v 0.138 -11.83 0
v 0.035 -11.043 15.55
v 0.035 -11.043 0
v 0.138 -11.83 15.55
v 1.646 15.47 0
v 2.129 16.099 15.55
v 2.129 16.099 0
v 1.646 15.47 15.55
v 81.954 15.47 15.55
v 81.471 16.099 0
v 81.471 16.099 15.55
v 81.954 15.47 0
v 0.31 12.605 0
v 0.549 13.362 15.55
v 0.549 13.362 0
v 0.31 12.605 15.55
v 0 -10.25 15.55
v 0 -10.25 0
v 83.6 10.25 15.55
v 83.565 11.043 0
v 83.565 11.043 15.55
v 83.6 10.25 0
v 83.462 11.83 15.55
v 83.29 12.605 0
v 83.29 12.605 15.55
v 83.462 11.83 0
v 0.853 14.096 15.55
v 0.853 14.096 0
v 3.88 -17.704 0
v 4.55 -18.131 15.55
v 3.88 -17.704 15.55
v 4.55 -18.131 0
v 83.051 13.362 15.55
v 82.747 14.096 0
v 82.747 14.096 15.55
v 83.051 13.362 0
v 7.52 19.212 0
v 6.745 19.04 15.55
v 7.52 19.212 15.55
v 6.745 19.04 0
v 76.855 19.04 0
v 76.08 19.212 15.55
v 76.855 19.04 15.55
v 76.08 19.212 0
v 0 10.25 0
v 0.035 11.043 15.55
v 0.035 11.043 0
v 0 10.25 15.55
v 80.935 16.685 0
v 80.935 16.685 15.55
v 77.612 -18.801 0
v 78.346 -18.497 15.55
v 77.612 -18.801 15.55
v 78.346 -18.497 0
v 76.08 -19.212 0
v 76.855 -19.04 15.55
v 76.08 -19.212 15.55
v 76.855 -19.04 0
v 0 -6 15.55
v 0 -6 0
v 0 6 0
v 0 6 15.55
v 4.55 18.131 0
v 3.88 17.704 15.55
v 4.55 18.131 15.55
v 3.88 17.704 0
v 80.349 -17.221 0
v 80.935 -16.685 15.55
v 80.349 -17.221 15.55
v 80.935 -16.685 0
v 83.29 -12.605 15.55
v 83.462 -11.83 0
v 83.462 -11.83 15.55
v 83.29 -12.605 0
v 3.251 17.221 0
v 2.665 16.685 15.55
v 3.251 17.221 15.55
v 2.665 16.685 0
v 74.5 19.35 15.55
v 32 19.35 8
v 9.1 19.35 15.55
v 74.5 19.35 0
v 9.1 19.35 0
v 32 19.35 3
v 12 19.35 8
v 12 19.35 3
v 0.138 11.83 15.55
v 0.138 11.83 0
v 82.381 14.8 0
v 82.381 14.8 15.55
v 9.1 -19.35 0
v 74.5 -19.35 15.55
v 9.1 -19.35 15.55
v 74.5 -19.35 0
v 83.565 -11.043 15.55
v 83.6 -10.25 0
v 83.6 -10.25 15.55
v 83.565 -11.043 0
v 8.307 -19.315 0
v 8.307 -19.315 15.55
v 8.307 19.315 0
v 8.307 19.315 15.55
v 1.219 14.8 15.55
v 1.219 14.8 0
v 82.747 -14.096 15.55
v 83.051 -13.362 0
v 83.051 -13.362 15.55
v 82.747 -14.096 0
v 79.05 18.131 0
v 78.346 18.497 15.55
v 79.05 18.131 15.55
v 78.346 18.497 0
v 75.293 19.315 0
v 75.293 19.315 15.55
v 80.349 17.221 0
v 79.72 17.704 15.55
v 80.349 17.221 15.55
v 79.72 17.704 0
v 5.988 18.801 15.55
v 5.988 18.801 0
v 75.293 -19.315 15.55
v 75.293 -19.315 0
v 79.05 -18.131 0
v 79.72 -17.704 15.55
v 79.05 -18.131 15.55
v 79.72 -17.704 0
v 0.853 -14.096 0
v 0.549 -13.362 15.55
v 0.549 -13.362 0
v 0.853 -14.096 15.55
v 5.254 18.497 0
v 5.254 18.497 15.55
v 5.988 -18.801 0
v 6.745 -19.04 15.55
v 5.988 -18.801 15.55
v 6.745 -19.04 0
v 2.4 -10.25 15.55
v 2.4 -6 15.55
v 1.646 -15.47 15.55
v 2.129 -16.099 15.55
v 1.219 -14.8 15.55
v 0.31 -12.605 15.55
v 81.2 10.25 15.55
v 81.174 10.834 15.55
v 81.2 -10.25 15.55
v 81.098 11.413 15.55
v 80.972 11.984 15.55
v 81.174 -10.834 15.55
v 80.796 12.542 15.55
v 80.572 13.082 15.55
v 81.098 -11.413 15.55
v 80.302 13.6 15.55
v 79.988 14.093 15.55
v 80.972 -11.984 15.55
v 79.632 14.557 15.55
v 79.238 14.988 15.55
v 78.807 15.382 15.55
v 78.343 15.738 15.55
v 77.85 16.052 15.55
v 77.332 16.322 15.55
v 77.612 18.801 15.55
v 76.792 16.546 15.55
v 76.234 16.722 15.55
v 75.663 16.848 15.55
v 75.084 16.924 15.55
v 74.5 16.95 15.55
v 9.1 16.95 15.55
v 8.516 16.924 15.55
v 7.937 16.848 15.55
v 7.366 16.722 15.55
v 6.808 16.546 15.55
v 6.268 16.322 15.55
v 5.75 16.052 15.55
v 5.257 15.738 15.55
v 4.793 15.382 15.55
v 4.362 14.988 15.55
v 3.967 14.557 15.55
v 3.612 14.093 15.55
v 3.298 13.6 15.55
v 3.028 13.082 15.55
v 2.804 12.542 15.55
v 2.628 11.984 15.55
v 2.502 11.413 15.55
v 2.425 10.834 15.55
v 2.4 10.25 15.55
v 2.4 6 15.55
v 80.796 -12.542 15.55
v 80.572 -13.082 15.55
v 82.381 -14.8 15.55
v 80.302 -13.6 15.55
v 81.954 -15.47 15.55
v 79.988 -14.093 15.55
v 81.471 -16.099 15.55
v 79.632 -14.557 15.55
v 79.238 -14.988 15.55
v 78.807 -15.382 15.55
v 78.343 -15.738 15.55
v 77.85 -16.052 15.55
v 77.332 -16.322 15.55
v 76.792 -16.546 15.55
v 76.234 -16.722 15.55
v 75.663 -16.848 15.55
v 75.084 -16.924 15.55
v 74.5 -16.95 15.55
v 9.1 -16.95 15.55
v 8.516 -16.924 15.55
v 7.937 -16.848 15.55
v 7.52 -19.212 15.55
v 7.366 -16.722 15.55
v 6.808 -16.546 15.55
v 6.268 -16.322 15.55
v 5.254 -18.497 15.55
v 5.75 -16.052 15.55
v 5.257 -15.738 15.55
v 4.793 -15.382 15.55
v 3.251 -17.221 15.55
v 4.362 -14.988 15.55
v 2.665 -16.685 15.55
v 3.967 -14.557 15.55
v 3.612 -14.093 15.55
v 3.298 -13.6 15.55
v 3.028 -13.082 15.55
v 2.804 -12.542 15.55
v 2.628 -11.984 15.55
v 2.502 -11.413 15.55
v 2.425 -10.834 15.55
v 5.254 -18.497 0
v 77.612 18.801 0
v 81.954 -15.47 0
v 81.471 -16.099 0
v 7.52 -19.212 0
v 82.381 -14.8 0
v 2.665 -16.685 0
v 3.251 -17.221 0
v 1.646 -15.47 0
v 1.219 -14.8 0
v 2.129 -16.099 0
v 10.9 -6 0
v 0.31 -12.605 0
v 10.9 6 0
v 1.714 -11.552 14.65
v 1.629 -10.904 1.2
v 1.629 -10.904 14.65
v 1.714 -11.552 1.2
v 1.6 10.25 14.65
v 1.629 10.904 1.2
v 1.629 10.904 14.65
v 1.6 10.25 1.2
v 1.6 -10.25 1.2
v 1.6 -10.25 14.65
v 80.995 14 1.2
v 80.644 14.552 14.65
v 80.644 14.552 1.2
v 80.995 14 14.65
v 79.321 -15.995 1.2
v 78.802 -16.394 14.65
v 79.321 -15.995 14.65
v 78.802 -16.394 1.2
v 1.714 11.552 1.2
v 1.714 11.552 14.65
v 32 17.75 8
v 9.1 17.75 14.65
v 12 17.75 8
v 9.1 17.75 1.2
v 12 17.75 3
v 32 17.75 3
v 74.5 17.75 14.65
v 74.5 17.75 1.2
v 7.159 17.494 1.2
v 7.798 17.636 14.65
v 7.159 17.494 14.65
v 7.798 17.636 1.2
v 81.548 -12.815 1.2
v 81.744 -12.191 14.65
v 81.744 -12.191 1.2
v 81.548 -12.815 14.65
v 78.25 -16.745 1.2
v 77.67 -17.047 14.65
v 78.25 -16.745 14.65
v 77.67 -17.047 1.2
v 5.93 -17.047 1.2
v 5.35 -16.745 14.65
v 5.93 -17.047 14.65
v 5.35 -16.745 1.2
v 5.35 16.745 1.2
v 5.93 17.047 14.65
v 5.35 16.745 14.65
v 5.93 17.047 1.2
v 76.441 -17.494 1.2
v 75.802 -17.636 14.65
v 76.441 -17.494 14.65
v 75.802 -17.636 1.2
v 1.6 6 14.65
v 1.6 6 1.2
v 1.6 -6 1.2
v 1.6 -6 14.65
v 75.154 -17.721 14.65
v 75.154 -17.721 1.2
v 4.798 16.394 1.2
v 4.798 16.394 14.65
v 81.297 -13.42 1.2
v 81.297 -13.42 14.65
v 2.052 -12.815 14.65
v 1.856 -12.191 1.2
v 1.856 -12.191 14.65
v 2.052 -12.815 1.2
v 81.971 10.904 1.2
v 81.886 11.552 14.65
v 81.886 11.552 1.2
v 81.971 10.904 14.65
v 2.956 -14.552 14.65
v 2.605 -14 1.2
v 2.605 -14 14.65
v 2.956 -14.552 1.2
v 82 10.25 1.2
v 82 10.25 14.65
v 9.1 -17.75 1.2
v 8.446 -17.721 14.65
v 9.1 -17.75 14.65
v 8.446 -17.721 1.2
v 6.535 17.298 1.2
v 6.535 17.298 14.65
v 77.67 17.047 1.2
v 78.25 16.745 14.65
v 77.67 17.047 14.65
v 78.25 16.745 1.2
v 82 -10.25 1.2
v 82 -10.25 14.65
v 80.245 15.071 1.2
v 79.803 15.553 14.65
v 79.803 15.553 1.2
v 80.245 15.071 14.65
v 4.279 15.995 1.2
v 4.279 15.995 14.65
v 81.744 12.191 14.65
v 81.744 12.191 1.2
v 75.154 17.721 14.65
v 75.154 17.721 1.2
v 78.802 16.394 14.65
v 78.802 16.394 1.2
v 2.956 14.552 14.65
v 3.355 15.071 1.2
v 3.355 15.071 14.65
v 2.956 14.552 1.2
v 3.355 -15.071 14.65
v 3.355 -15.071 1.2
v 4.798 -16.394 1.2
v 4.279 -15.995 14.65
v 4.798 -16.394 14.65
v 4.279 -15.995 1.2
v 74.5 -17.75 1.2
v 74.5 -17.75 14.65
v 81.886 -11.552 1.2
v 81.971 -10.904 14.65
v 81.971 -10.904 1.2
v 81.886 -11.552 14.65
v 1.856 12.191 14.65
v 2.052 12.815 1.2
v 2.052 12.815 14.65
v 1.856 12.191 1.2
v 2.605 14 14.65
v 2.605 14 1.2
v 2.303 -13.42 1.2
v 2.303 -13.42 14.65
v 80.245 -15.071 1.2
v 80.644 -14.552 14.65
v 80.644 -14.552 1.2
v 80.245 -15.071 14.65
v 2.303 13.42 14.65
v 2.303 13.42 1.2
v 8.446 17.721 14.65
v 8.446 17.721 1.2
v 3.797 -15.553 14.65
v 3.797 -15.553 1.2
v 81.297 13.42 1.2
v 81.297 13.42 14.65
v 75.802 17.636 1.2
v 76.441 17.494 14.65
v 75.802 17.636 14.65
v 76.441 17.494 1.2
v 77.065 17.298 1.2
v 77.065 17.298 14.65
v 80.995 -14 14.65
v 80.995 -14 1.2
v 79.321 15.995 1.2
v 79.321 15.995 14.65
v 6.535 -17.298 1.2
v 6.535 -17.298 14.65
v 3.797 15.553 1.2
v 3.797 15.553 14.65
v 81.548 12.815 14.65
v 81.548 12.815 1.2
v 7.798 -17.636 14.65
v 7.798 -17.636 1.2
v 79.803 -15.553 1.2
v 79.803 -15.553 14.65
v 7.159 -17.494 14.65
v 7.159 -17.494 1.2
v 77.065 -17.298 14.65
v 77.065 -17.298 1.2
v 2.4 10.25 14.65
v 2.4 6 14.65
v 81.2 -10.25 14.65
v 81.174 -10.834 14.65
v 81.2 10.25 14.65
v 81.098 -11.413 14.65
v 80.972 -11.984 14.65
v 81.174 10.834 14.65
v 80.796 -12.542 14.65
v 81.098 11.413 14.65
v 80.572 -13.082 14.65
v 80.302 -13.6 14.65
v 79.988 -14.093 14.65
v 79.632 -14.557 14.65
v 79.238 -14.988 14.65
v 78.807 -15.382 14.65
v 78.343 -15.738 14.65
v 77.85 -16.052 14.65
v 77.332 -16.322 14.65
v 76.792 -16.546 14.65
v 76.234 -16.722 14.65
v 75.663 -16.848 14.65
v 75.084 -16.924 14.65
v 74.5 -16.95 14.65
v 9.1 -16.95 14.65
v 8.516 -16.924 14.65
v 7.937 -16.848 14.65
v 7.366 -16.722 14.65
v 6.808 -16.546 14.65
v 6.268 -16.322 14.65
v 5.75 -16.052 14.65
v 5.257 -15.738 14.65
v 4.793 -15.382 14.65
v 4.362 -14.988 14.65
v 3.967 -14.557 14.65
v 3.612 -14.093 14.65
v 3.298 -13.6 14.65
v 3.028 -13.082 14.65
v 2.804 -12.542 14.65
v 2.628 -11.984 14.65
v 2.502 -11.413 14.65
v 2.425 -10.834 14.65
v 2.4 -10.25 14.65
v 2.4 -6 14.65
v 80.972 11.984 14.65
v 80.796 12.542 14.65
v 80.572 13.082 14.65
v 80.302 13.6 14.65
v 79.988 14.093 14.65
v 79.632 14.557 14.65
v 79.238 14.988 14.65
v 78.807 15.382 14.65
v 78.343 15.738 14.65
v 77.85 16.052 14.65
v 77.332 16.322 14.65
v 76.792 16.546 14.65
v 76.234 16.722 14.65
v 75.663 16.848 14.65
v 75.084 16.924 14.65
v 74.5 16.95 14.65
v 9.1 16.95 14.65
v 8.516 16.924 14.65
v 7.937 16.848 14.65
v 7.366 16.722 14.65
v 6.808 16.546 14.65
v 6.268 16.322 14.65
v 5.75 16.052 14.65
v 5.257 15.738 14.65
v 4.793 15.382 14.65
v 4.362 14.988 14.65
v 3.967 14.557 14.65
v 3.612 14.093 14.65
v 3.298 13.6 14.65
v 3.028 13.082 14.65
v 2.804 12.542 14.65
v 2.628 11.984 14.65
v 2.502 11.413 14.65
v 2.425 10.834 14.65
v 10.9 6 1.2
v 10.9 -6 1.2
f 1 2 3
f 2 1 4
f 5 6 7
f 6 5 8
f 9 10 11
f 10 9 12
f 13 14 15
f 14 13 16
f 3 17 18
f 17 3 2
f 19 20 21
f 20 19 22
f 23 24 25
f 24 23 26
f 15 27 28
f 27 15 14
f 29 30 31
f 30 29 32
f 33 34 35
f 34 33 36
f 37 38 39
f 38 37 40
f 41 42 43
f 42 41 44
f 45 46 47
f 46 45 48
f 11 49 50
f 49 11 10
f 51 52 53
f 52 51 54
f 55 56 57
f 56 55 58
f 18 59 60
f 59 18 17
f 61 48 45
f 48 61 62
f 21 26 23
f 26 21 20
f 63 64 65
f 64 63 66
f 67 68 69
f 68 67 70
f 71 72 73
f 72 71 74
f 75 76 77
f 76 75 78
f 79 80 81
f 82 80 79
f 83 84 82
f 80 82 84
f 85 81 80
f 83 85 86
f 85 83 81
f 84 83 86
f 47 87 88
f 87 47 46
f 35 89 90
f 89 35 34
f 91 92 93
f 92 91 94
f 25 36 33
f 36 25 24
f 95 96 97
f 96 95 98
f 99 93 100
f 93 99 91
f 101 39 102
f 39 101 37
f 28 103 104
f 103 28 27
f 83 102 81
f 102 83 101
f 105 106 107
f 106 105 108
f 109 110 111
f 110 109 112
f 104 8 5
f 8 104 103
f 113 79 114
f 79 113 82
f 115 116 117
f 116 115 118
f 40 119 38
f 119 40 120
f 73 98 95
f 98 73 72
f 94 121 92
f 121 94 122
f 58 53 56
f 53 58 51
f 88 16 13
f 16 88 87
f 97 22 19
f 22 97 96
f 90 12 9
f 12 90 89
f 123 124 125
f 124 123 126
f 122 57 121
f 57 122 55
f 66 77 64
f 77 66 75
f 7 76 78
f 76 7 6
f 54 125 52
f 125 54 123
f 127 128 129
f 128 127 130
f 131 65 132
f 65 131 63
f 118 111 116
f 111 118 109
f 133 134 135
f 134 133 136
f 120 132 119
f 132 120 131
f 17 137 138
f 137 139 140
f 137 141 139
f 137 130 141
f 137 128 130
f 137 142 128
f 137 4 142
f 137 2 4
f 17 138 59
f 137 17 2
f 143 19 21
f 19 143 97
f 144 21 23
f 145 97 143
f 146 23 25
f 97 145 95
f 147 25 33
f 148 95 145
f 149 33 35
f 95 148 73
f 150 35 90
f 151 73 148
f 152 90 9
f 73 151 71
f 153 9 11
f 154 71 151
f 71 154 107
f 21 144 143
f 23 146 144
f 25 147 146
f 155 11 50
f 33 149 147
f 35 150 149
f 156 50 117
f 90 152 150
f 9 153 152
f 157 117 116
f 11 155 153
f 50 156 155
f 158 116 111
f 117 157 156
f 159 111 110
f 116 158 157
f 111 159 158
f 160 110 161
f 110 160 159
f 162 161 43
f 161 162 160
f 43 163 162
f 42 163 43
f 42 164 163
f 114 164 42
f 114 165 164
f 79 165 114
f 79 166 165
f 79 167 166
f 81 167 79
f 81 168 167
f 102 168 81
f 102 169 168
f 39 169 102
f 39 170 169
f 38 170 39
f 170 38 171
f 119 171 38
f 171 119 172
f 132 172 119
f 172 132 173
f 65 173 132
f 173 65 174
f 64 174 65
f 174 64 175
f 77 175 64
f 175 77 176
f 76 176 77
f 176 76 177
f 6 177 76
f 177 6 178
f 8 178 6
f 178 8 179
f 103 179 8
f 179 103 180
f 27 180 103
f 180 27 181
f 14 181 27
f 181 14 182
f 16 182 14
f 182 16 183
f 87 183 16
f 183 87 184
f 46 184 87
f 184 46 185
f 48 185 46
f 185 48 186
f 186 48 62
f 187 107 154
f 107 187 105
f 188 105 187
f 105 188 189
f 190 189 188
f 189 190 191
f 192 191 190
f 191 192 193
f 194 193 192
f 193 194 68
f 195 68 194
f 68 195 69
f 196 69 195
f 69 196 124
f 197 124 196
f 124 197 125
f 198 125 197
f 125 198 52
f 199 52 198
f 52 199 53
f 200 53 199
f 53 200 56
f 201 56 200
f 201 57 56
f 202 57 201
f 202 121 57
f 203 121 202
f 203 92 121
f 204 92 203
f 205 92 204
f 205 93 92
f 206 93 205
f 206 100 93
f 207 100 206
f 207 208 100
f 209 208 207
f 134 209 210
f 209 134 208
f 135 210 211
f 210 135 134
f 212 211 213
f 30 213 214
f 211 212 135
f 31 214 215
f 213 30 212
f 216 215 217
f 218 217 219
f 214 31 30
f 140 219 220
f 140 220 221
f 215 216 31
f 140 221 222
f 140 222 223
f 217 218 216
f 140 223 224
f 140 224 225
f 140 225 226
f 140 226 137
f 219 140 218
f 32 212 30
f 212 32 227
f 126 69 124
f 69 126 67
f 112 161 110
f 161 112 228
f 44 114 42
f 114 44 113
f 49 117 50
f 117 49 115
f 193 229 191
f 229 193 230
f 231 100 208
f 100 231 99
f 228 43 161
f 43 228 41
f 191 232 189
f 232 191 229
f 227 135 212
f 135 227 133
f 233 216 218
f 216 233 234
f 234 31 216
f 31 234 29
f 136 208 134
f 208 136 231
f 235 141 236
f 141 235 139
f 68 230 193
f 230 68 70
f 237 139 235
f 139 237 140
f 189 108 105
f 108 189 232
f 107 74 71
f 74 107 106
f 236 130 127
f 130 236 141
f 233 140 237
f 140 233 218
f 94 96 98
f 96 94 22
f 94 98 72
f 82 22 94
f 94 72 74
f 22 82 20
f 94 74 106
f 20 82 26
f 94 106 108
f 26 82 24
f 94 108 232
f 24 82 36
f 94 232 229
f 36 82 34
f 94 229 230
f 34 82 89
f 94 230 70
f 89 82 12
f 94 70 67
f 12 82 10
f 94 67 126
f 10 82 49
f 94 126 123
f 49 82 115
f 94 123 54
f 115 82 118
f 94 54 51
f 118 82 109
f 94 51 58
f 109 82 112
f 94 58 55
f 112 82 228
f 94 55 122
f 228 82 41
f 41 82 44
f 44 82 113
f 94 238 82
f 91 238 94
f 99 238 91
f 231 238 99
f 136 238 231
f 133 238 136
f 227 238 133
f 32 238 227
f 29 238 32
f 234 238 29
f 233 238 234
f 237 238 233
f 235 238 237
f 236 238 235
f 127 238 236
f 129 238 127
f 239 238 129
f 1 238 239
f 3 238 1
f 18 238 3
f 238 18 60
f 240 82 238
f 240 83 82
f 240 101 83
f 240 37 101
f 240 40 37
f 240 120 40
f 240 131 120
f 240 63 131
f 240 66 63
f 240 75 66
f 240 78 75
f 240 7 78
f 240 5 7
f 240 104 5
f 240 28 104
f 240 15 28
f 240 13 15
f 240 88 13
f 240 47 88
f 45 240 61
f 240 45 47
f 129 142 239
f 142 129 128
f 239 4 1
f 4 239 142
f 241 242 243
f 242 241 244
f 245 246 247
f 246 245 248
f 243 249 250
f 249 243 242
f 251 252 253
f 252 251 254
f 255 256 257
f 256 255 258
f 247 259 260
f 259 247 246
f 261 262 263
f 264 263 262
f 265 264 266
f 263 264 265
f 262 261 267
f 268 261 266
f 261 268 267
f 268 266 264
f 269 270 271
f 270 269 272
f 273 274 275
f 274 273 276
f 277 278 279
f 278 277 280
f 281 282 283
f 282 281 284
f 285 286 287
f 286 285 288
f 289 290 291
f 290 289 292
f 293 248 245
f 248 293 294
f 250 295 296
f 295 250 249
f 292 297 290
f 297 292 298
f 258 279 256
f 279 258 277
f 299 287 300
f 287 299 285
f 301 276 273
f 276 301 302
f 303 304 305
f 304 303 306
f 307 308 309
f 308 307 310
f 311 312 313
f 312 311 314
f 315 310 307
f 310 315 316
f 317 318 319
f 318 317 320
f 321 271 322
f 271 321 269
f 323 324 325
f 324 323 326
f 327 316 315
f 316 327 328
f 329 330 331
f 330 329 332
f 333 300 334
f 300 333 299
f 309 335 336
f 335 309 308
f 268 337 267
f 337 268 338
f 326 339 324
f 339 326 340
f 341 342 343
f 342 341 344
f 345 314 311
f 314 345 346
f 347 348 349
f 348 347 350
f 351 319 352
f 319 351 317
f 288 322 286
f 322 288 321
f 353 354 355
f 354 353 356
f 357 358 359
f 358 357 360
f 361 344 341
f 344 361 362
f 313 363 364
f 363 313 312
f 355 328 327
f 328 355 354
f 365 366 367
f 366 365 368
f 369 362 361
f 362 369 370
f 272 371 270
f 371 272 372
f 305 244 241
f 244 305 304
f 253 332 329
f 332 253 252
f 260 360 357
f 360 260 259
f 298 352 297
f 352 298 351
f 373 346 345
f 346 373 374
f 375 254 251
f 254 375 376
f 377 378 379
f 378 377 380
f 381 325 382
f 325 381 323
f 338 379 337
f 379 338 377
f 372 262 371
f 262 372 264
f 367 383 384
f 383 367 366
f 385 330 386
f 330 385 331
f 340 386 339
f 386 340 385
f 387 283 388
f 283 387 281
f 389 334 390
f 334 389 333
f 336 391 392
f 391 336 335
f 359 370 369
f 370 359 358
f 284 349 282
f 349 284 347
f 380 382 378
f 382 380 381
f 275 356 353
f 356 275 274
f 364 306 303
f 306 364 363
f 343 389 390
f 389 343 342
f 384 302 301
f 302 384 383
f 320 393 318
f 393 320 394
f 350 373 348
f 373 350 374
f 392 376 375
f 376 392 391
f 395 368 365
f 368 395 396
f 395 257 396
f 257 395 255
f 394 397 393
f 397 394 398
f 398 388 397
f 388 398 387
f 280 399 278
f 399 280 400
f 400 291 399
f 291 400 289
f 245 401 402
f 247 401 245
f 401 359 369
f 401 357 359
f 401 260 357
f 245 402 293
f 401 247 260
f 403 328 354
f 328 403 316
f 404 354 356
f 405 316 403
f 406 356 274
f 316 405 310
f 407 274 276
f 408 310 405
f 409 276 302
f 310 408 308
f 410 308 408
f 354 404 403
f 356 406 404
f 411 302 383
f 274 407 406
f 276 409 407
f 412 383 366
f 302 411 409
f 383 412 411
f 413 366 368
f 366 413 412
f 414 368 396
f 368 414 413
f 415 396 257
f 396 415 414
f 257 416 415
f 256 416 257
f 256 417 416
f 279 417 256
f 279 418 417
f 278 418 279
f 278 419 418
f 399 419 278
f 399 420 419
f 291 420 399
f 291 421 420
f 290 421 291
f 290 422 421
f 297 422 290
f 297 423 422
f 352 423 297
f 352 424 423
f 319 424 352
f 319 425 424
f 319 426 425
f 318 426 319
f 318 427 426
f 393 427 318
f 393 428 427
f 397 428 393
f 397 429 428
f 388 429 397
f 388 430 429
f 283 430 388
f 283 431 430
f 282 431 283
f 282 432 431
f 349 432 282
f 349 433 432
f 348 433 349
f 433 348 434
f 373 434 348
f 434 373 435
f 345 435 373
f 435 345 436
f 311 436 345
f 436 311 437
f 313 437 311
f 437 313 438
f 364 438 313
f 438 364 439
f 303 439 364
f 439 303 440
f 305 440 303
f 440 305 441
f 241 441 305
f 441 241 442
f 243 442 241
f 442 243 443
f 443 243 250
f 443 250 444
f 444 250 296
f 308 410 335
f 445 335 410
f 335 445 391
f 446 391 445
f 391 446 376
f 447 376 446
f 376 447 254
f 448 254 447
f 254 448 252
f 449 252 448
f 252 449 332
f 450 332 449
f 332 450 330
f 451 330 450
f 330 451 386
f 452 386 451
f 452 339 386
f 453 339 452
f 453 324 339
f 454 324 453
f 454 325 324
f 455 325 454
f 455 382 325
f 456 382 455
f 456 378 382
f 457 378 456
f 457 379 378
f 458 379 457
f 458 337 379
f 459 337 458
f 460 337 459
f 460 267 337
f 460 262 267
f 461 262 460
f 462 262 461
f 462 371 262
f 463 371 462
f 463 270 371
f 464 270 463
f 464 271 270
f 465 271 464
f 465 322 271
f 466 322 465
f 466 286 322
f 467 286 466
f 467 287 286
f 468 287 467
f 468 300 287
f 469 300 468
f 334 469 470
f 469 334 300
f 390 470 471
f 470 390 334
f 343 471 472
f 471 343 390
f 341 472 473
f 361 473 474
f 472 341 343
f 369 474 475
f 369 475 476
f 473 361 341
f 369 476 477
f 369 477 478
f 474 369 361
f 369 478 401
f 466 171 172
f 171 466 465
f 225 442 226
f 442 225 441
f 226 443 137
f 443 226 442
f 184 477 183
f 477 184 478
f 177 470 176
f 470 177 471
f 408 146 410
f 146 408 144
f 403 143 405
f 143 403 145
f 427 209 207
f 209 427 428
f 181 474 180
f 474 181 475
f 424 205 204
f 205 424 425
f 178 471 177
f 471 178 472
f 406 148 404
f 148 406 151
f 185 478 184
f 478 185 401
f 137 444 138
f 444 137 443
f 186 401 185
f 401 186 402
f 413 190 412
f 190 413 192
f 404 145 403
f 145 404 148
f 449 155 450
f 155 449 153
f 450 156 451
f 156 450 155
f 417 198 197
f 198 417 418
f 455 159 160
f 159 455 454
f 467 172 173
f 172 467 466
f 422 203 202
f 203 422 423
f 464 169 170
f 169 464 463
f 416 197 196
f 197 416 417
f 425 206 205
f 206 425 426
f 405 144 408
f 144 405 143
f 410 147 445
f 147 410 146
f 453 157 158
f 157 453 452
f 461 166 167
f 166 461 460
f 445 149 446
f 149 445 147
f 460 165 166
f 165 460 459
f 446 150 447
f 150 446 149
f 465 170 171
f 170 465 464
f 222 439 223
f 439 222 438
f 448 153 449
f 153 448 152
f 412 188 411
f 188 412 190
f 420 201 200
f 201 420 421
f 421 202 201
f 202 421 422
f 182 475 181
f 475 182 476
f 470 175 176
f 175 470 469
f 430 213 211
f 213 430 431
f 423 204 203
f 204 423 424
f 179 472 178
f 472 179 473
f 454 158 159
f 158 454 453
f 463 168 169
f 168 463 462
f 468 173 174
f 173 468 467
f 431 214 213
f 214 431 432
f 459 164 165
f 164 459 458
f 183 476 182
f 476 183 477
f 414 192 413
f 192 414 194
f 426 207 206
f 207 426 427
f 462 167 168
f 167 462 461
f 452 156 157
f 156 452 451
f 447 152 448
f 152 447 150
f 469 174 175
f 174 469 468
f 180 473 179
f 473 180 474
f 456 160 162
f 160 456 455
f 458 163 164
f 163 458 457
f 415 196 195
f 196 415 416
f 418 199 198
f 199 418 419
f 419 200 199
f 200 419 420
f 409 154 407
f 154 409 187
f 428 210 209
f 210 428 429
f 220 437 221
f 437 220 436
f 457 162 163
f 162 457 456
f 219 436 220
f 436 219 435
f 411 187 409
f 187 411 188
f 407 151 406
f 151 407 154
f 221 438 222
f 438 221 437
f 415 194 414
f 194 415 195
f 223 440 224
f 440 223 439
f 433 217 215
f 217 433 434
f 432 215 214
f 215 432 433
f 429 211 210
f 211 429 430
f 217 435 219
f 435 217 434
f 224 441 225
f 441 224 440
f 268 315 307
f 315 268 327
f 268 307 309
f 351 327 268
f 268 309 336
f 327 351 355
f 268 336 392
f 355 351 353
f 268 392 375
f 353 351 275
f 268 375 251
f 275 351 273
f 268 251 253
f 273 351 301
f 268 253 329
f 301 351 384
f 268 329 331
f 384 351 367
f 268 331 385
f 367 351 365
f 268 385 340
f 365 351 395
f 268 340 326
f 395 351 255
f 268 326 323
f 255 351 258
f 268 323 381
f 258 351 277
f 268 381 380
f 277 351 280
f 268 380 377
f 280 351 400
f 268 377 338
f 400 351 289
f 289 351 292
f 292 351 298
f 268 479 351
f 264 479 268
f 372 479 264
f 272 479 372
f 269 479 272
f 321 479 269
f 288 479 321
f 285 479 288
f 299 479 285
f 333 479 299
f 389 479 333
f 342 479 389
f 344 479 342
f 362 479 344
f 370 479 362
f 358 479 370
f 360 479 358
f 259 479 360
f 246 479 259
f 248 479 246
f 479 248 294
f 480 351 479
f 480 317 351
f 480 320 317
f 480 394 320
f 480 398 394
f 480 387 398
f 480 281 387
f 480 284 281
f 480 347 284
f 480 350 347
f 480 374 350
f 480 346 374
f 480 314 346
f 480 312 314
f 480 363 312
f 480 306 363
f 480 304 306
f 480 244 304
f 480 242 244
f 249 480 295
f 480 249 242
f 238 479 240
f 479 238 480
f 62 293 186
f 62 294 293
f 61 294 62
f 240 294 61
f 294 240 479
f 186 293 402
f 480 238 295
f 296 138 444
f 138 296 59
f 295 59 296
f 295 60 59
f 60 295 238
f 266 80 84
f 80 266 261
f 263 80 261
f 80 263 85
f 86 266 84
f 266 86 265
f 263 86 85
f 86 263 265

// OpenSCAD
// BYD SEAL — bumper protetor em TPU
// V0.1 PARAMÉTRICA — face frontal aberta, traseira e laterais protegidas.
// O manual oficial confirma quatro controles, indicador e chave mecânica,
// mas não publica dimensões da carcaça.
// X = comprimento; Y = largura; Z = espessura.

$fn = 72;
MODEL_NAME = "BYD SEAL";

// Medidas provisórias do corpo da chave
KEY_L = 80.0;       // X, mm
KEY_W = 35.0;       // Y, mm
KEY_T = 15.0;       // Z, mm
KEY_R = 7.5;

// Folgas e paredes TPU
CLR_X = 0.40;
CLR_Y = 0.25;
CLR_Z = 0.35;
BACK = 1.20;
SIDE_WALL = 1.60;
FACE_CLEARANCE = 1.00;
LIP_IN = 0.80;
LIP_H = 0.90;

// Abertura para argola/cinta; confirmar na smart key do mercado do usuário.
RING_NOTCH_L = 11.0;
RING_NOTCH_W = 12.0;

// Abertura de serviço para chave mecânica removível/integrada.
MECH_SLOT = true;
MECH_SLOT_X = 12.0;
MECH_SLOT_L = 20.0;
MECH_SLOT_Z = 3.0;
MECH_SLOT_H = 5.0;
MECH_SLOT_SIDE = 1;

INNER_L = KEY_L + CLR_X;
INNER_W = KEY_W + 2*CLR_Y;
INNER_T = KEY_T + CLR_Z;
OUTER_L = INNER_L + 2*SIDE_WALL;
OUTER_W = INNER_W + 2*SIDE_WALL;
WALL_H = max(1.0, INNER_T - FACE_CLEARANCE);
OUTER_H = BACK + WALL_H;
OUTER_R = min(KEY_R + SIDE_WALL, OUTER_W/2 - 0.30);
INNER_R = min(KEY_R, INNER_W/2 - 0.30);

module rounded2d(l,w,r) {
    hull() {
        for (x=[r,l-r])
            for (y=[-w/2+r,w/2-r])
                translate([x,y]) circle(r=r);
    }
}
module rounded_prism(l,w,h,r) { linear_extrude(height=h) rounded2d(l,w,r); }
module base_plate() { rounded_prism(OUTER_L,OUTER_W,BACK,OUTER_R); }
module side_ring() {
    difference() {
        rounded_prism(OUTER_L,OUTER_W,OUTER_H,OUTER_R);
        translate([SIDE_WALL,0,BACK-0.05]) rounded_prism(INNER_L,INNER_W,WALL_H+0.20,INNER_R);
    }
}
module retention_lip() {
    difference() {
        translate([0,0,BACK+WALL_H-LIP_H]) rounded_prism(OUTER_L,OUTER_W,LIP_H,OUTER_R);
        translate([SIDE_WALL+LIP_IN,0,BACK+WALL_H-LIP_H-0.05])
            rounded_prism(INNER_L-2*LIP_IN,INNER_W-2*LIP_IN,LIP_H+0.20,max(0.5,INNER_R-LIP_IN));
    }
}
module ring_notch() {
    translate([-0.10,-RING_NOTCH_W/2,-0.10]) cube([RING_NOTCH_L,RING_NOTCH_W,OUTER_H+0.30]);
}
module mechanical_slot() {
    if (MECH_SLOT) {
        y0 = MECH_SLOT_SIDE > 0 ? OUTER_W/2-SIDE_WALL-0.10 : -OUTER_W/2+0.10;
        translate([MECH_SLOT_X,y0,MECH_SLOT_Z]) cube([MECH_SLOT_L,SIDE_WALL+0.40,MECH_SLOT_H]);
    }
}
module bumper() {
    difference() {
        union() { base_plate(); side_ring(); retention_lip(); }
        ring_notch();
        mechanical_slot();
    }
}

bumper();

// Deixar acessíveis lock, unlock, trunk, Start/Stop, indicador e chave mecânica.
// Imprimir um teste curto antes da peça completa.
